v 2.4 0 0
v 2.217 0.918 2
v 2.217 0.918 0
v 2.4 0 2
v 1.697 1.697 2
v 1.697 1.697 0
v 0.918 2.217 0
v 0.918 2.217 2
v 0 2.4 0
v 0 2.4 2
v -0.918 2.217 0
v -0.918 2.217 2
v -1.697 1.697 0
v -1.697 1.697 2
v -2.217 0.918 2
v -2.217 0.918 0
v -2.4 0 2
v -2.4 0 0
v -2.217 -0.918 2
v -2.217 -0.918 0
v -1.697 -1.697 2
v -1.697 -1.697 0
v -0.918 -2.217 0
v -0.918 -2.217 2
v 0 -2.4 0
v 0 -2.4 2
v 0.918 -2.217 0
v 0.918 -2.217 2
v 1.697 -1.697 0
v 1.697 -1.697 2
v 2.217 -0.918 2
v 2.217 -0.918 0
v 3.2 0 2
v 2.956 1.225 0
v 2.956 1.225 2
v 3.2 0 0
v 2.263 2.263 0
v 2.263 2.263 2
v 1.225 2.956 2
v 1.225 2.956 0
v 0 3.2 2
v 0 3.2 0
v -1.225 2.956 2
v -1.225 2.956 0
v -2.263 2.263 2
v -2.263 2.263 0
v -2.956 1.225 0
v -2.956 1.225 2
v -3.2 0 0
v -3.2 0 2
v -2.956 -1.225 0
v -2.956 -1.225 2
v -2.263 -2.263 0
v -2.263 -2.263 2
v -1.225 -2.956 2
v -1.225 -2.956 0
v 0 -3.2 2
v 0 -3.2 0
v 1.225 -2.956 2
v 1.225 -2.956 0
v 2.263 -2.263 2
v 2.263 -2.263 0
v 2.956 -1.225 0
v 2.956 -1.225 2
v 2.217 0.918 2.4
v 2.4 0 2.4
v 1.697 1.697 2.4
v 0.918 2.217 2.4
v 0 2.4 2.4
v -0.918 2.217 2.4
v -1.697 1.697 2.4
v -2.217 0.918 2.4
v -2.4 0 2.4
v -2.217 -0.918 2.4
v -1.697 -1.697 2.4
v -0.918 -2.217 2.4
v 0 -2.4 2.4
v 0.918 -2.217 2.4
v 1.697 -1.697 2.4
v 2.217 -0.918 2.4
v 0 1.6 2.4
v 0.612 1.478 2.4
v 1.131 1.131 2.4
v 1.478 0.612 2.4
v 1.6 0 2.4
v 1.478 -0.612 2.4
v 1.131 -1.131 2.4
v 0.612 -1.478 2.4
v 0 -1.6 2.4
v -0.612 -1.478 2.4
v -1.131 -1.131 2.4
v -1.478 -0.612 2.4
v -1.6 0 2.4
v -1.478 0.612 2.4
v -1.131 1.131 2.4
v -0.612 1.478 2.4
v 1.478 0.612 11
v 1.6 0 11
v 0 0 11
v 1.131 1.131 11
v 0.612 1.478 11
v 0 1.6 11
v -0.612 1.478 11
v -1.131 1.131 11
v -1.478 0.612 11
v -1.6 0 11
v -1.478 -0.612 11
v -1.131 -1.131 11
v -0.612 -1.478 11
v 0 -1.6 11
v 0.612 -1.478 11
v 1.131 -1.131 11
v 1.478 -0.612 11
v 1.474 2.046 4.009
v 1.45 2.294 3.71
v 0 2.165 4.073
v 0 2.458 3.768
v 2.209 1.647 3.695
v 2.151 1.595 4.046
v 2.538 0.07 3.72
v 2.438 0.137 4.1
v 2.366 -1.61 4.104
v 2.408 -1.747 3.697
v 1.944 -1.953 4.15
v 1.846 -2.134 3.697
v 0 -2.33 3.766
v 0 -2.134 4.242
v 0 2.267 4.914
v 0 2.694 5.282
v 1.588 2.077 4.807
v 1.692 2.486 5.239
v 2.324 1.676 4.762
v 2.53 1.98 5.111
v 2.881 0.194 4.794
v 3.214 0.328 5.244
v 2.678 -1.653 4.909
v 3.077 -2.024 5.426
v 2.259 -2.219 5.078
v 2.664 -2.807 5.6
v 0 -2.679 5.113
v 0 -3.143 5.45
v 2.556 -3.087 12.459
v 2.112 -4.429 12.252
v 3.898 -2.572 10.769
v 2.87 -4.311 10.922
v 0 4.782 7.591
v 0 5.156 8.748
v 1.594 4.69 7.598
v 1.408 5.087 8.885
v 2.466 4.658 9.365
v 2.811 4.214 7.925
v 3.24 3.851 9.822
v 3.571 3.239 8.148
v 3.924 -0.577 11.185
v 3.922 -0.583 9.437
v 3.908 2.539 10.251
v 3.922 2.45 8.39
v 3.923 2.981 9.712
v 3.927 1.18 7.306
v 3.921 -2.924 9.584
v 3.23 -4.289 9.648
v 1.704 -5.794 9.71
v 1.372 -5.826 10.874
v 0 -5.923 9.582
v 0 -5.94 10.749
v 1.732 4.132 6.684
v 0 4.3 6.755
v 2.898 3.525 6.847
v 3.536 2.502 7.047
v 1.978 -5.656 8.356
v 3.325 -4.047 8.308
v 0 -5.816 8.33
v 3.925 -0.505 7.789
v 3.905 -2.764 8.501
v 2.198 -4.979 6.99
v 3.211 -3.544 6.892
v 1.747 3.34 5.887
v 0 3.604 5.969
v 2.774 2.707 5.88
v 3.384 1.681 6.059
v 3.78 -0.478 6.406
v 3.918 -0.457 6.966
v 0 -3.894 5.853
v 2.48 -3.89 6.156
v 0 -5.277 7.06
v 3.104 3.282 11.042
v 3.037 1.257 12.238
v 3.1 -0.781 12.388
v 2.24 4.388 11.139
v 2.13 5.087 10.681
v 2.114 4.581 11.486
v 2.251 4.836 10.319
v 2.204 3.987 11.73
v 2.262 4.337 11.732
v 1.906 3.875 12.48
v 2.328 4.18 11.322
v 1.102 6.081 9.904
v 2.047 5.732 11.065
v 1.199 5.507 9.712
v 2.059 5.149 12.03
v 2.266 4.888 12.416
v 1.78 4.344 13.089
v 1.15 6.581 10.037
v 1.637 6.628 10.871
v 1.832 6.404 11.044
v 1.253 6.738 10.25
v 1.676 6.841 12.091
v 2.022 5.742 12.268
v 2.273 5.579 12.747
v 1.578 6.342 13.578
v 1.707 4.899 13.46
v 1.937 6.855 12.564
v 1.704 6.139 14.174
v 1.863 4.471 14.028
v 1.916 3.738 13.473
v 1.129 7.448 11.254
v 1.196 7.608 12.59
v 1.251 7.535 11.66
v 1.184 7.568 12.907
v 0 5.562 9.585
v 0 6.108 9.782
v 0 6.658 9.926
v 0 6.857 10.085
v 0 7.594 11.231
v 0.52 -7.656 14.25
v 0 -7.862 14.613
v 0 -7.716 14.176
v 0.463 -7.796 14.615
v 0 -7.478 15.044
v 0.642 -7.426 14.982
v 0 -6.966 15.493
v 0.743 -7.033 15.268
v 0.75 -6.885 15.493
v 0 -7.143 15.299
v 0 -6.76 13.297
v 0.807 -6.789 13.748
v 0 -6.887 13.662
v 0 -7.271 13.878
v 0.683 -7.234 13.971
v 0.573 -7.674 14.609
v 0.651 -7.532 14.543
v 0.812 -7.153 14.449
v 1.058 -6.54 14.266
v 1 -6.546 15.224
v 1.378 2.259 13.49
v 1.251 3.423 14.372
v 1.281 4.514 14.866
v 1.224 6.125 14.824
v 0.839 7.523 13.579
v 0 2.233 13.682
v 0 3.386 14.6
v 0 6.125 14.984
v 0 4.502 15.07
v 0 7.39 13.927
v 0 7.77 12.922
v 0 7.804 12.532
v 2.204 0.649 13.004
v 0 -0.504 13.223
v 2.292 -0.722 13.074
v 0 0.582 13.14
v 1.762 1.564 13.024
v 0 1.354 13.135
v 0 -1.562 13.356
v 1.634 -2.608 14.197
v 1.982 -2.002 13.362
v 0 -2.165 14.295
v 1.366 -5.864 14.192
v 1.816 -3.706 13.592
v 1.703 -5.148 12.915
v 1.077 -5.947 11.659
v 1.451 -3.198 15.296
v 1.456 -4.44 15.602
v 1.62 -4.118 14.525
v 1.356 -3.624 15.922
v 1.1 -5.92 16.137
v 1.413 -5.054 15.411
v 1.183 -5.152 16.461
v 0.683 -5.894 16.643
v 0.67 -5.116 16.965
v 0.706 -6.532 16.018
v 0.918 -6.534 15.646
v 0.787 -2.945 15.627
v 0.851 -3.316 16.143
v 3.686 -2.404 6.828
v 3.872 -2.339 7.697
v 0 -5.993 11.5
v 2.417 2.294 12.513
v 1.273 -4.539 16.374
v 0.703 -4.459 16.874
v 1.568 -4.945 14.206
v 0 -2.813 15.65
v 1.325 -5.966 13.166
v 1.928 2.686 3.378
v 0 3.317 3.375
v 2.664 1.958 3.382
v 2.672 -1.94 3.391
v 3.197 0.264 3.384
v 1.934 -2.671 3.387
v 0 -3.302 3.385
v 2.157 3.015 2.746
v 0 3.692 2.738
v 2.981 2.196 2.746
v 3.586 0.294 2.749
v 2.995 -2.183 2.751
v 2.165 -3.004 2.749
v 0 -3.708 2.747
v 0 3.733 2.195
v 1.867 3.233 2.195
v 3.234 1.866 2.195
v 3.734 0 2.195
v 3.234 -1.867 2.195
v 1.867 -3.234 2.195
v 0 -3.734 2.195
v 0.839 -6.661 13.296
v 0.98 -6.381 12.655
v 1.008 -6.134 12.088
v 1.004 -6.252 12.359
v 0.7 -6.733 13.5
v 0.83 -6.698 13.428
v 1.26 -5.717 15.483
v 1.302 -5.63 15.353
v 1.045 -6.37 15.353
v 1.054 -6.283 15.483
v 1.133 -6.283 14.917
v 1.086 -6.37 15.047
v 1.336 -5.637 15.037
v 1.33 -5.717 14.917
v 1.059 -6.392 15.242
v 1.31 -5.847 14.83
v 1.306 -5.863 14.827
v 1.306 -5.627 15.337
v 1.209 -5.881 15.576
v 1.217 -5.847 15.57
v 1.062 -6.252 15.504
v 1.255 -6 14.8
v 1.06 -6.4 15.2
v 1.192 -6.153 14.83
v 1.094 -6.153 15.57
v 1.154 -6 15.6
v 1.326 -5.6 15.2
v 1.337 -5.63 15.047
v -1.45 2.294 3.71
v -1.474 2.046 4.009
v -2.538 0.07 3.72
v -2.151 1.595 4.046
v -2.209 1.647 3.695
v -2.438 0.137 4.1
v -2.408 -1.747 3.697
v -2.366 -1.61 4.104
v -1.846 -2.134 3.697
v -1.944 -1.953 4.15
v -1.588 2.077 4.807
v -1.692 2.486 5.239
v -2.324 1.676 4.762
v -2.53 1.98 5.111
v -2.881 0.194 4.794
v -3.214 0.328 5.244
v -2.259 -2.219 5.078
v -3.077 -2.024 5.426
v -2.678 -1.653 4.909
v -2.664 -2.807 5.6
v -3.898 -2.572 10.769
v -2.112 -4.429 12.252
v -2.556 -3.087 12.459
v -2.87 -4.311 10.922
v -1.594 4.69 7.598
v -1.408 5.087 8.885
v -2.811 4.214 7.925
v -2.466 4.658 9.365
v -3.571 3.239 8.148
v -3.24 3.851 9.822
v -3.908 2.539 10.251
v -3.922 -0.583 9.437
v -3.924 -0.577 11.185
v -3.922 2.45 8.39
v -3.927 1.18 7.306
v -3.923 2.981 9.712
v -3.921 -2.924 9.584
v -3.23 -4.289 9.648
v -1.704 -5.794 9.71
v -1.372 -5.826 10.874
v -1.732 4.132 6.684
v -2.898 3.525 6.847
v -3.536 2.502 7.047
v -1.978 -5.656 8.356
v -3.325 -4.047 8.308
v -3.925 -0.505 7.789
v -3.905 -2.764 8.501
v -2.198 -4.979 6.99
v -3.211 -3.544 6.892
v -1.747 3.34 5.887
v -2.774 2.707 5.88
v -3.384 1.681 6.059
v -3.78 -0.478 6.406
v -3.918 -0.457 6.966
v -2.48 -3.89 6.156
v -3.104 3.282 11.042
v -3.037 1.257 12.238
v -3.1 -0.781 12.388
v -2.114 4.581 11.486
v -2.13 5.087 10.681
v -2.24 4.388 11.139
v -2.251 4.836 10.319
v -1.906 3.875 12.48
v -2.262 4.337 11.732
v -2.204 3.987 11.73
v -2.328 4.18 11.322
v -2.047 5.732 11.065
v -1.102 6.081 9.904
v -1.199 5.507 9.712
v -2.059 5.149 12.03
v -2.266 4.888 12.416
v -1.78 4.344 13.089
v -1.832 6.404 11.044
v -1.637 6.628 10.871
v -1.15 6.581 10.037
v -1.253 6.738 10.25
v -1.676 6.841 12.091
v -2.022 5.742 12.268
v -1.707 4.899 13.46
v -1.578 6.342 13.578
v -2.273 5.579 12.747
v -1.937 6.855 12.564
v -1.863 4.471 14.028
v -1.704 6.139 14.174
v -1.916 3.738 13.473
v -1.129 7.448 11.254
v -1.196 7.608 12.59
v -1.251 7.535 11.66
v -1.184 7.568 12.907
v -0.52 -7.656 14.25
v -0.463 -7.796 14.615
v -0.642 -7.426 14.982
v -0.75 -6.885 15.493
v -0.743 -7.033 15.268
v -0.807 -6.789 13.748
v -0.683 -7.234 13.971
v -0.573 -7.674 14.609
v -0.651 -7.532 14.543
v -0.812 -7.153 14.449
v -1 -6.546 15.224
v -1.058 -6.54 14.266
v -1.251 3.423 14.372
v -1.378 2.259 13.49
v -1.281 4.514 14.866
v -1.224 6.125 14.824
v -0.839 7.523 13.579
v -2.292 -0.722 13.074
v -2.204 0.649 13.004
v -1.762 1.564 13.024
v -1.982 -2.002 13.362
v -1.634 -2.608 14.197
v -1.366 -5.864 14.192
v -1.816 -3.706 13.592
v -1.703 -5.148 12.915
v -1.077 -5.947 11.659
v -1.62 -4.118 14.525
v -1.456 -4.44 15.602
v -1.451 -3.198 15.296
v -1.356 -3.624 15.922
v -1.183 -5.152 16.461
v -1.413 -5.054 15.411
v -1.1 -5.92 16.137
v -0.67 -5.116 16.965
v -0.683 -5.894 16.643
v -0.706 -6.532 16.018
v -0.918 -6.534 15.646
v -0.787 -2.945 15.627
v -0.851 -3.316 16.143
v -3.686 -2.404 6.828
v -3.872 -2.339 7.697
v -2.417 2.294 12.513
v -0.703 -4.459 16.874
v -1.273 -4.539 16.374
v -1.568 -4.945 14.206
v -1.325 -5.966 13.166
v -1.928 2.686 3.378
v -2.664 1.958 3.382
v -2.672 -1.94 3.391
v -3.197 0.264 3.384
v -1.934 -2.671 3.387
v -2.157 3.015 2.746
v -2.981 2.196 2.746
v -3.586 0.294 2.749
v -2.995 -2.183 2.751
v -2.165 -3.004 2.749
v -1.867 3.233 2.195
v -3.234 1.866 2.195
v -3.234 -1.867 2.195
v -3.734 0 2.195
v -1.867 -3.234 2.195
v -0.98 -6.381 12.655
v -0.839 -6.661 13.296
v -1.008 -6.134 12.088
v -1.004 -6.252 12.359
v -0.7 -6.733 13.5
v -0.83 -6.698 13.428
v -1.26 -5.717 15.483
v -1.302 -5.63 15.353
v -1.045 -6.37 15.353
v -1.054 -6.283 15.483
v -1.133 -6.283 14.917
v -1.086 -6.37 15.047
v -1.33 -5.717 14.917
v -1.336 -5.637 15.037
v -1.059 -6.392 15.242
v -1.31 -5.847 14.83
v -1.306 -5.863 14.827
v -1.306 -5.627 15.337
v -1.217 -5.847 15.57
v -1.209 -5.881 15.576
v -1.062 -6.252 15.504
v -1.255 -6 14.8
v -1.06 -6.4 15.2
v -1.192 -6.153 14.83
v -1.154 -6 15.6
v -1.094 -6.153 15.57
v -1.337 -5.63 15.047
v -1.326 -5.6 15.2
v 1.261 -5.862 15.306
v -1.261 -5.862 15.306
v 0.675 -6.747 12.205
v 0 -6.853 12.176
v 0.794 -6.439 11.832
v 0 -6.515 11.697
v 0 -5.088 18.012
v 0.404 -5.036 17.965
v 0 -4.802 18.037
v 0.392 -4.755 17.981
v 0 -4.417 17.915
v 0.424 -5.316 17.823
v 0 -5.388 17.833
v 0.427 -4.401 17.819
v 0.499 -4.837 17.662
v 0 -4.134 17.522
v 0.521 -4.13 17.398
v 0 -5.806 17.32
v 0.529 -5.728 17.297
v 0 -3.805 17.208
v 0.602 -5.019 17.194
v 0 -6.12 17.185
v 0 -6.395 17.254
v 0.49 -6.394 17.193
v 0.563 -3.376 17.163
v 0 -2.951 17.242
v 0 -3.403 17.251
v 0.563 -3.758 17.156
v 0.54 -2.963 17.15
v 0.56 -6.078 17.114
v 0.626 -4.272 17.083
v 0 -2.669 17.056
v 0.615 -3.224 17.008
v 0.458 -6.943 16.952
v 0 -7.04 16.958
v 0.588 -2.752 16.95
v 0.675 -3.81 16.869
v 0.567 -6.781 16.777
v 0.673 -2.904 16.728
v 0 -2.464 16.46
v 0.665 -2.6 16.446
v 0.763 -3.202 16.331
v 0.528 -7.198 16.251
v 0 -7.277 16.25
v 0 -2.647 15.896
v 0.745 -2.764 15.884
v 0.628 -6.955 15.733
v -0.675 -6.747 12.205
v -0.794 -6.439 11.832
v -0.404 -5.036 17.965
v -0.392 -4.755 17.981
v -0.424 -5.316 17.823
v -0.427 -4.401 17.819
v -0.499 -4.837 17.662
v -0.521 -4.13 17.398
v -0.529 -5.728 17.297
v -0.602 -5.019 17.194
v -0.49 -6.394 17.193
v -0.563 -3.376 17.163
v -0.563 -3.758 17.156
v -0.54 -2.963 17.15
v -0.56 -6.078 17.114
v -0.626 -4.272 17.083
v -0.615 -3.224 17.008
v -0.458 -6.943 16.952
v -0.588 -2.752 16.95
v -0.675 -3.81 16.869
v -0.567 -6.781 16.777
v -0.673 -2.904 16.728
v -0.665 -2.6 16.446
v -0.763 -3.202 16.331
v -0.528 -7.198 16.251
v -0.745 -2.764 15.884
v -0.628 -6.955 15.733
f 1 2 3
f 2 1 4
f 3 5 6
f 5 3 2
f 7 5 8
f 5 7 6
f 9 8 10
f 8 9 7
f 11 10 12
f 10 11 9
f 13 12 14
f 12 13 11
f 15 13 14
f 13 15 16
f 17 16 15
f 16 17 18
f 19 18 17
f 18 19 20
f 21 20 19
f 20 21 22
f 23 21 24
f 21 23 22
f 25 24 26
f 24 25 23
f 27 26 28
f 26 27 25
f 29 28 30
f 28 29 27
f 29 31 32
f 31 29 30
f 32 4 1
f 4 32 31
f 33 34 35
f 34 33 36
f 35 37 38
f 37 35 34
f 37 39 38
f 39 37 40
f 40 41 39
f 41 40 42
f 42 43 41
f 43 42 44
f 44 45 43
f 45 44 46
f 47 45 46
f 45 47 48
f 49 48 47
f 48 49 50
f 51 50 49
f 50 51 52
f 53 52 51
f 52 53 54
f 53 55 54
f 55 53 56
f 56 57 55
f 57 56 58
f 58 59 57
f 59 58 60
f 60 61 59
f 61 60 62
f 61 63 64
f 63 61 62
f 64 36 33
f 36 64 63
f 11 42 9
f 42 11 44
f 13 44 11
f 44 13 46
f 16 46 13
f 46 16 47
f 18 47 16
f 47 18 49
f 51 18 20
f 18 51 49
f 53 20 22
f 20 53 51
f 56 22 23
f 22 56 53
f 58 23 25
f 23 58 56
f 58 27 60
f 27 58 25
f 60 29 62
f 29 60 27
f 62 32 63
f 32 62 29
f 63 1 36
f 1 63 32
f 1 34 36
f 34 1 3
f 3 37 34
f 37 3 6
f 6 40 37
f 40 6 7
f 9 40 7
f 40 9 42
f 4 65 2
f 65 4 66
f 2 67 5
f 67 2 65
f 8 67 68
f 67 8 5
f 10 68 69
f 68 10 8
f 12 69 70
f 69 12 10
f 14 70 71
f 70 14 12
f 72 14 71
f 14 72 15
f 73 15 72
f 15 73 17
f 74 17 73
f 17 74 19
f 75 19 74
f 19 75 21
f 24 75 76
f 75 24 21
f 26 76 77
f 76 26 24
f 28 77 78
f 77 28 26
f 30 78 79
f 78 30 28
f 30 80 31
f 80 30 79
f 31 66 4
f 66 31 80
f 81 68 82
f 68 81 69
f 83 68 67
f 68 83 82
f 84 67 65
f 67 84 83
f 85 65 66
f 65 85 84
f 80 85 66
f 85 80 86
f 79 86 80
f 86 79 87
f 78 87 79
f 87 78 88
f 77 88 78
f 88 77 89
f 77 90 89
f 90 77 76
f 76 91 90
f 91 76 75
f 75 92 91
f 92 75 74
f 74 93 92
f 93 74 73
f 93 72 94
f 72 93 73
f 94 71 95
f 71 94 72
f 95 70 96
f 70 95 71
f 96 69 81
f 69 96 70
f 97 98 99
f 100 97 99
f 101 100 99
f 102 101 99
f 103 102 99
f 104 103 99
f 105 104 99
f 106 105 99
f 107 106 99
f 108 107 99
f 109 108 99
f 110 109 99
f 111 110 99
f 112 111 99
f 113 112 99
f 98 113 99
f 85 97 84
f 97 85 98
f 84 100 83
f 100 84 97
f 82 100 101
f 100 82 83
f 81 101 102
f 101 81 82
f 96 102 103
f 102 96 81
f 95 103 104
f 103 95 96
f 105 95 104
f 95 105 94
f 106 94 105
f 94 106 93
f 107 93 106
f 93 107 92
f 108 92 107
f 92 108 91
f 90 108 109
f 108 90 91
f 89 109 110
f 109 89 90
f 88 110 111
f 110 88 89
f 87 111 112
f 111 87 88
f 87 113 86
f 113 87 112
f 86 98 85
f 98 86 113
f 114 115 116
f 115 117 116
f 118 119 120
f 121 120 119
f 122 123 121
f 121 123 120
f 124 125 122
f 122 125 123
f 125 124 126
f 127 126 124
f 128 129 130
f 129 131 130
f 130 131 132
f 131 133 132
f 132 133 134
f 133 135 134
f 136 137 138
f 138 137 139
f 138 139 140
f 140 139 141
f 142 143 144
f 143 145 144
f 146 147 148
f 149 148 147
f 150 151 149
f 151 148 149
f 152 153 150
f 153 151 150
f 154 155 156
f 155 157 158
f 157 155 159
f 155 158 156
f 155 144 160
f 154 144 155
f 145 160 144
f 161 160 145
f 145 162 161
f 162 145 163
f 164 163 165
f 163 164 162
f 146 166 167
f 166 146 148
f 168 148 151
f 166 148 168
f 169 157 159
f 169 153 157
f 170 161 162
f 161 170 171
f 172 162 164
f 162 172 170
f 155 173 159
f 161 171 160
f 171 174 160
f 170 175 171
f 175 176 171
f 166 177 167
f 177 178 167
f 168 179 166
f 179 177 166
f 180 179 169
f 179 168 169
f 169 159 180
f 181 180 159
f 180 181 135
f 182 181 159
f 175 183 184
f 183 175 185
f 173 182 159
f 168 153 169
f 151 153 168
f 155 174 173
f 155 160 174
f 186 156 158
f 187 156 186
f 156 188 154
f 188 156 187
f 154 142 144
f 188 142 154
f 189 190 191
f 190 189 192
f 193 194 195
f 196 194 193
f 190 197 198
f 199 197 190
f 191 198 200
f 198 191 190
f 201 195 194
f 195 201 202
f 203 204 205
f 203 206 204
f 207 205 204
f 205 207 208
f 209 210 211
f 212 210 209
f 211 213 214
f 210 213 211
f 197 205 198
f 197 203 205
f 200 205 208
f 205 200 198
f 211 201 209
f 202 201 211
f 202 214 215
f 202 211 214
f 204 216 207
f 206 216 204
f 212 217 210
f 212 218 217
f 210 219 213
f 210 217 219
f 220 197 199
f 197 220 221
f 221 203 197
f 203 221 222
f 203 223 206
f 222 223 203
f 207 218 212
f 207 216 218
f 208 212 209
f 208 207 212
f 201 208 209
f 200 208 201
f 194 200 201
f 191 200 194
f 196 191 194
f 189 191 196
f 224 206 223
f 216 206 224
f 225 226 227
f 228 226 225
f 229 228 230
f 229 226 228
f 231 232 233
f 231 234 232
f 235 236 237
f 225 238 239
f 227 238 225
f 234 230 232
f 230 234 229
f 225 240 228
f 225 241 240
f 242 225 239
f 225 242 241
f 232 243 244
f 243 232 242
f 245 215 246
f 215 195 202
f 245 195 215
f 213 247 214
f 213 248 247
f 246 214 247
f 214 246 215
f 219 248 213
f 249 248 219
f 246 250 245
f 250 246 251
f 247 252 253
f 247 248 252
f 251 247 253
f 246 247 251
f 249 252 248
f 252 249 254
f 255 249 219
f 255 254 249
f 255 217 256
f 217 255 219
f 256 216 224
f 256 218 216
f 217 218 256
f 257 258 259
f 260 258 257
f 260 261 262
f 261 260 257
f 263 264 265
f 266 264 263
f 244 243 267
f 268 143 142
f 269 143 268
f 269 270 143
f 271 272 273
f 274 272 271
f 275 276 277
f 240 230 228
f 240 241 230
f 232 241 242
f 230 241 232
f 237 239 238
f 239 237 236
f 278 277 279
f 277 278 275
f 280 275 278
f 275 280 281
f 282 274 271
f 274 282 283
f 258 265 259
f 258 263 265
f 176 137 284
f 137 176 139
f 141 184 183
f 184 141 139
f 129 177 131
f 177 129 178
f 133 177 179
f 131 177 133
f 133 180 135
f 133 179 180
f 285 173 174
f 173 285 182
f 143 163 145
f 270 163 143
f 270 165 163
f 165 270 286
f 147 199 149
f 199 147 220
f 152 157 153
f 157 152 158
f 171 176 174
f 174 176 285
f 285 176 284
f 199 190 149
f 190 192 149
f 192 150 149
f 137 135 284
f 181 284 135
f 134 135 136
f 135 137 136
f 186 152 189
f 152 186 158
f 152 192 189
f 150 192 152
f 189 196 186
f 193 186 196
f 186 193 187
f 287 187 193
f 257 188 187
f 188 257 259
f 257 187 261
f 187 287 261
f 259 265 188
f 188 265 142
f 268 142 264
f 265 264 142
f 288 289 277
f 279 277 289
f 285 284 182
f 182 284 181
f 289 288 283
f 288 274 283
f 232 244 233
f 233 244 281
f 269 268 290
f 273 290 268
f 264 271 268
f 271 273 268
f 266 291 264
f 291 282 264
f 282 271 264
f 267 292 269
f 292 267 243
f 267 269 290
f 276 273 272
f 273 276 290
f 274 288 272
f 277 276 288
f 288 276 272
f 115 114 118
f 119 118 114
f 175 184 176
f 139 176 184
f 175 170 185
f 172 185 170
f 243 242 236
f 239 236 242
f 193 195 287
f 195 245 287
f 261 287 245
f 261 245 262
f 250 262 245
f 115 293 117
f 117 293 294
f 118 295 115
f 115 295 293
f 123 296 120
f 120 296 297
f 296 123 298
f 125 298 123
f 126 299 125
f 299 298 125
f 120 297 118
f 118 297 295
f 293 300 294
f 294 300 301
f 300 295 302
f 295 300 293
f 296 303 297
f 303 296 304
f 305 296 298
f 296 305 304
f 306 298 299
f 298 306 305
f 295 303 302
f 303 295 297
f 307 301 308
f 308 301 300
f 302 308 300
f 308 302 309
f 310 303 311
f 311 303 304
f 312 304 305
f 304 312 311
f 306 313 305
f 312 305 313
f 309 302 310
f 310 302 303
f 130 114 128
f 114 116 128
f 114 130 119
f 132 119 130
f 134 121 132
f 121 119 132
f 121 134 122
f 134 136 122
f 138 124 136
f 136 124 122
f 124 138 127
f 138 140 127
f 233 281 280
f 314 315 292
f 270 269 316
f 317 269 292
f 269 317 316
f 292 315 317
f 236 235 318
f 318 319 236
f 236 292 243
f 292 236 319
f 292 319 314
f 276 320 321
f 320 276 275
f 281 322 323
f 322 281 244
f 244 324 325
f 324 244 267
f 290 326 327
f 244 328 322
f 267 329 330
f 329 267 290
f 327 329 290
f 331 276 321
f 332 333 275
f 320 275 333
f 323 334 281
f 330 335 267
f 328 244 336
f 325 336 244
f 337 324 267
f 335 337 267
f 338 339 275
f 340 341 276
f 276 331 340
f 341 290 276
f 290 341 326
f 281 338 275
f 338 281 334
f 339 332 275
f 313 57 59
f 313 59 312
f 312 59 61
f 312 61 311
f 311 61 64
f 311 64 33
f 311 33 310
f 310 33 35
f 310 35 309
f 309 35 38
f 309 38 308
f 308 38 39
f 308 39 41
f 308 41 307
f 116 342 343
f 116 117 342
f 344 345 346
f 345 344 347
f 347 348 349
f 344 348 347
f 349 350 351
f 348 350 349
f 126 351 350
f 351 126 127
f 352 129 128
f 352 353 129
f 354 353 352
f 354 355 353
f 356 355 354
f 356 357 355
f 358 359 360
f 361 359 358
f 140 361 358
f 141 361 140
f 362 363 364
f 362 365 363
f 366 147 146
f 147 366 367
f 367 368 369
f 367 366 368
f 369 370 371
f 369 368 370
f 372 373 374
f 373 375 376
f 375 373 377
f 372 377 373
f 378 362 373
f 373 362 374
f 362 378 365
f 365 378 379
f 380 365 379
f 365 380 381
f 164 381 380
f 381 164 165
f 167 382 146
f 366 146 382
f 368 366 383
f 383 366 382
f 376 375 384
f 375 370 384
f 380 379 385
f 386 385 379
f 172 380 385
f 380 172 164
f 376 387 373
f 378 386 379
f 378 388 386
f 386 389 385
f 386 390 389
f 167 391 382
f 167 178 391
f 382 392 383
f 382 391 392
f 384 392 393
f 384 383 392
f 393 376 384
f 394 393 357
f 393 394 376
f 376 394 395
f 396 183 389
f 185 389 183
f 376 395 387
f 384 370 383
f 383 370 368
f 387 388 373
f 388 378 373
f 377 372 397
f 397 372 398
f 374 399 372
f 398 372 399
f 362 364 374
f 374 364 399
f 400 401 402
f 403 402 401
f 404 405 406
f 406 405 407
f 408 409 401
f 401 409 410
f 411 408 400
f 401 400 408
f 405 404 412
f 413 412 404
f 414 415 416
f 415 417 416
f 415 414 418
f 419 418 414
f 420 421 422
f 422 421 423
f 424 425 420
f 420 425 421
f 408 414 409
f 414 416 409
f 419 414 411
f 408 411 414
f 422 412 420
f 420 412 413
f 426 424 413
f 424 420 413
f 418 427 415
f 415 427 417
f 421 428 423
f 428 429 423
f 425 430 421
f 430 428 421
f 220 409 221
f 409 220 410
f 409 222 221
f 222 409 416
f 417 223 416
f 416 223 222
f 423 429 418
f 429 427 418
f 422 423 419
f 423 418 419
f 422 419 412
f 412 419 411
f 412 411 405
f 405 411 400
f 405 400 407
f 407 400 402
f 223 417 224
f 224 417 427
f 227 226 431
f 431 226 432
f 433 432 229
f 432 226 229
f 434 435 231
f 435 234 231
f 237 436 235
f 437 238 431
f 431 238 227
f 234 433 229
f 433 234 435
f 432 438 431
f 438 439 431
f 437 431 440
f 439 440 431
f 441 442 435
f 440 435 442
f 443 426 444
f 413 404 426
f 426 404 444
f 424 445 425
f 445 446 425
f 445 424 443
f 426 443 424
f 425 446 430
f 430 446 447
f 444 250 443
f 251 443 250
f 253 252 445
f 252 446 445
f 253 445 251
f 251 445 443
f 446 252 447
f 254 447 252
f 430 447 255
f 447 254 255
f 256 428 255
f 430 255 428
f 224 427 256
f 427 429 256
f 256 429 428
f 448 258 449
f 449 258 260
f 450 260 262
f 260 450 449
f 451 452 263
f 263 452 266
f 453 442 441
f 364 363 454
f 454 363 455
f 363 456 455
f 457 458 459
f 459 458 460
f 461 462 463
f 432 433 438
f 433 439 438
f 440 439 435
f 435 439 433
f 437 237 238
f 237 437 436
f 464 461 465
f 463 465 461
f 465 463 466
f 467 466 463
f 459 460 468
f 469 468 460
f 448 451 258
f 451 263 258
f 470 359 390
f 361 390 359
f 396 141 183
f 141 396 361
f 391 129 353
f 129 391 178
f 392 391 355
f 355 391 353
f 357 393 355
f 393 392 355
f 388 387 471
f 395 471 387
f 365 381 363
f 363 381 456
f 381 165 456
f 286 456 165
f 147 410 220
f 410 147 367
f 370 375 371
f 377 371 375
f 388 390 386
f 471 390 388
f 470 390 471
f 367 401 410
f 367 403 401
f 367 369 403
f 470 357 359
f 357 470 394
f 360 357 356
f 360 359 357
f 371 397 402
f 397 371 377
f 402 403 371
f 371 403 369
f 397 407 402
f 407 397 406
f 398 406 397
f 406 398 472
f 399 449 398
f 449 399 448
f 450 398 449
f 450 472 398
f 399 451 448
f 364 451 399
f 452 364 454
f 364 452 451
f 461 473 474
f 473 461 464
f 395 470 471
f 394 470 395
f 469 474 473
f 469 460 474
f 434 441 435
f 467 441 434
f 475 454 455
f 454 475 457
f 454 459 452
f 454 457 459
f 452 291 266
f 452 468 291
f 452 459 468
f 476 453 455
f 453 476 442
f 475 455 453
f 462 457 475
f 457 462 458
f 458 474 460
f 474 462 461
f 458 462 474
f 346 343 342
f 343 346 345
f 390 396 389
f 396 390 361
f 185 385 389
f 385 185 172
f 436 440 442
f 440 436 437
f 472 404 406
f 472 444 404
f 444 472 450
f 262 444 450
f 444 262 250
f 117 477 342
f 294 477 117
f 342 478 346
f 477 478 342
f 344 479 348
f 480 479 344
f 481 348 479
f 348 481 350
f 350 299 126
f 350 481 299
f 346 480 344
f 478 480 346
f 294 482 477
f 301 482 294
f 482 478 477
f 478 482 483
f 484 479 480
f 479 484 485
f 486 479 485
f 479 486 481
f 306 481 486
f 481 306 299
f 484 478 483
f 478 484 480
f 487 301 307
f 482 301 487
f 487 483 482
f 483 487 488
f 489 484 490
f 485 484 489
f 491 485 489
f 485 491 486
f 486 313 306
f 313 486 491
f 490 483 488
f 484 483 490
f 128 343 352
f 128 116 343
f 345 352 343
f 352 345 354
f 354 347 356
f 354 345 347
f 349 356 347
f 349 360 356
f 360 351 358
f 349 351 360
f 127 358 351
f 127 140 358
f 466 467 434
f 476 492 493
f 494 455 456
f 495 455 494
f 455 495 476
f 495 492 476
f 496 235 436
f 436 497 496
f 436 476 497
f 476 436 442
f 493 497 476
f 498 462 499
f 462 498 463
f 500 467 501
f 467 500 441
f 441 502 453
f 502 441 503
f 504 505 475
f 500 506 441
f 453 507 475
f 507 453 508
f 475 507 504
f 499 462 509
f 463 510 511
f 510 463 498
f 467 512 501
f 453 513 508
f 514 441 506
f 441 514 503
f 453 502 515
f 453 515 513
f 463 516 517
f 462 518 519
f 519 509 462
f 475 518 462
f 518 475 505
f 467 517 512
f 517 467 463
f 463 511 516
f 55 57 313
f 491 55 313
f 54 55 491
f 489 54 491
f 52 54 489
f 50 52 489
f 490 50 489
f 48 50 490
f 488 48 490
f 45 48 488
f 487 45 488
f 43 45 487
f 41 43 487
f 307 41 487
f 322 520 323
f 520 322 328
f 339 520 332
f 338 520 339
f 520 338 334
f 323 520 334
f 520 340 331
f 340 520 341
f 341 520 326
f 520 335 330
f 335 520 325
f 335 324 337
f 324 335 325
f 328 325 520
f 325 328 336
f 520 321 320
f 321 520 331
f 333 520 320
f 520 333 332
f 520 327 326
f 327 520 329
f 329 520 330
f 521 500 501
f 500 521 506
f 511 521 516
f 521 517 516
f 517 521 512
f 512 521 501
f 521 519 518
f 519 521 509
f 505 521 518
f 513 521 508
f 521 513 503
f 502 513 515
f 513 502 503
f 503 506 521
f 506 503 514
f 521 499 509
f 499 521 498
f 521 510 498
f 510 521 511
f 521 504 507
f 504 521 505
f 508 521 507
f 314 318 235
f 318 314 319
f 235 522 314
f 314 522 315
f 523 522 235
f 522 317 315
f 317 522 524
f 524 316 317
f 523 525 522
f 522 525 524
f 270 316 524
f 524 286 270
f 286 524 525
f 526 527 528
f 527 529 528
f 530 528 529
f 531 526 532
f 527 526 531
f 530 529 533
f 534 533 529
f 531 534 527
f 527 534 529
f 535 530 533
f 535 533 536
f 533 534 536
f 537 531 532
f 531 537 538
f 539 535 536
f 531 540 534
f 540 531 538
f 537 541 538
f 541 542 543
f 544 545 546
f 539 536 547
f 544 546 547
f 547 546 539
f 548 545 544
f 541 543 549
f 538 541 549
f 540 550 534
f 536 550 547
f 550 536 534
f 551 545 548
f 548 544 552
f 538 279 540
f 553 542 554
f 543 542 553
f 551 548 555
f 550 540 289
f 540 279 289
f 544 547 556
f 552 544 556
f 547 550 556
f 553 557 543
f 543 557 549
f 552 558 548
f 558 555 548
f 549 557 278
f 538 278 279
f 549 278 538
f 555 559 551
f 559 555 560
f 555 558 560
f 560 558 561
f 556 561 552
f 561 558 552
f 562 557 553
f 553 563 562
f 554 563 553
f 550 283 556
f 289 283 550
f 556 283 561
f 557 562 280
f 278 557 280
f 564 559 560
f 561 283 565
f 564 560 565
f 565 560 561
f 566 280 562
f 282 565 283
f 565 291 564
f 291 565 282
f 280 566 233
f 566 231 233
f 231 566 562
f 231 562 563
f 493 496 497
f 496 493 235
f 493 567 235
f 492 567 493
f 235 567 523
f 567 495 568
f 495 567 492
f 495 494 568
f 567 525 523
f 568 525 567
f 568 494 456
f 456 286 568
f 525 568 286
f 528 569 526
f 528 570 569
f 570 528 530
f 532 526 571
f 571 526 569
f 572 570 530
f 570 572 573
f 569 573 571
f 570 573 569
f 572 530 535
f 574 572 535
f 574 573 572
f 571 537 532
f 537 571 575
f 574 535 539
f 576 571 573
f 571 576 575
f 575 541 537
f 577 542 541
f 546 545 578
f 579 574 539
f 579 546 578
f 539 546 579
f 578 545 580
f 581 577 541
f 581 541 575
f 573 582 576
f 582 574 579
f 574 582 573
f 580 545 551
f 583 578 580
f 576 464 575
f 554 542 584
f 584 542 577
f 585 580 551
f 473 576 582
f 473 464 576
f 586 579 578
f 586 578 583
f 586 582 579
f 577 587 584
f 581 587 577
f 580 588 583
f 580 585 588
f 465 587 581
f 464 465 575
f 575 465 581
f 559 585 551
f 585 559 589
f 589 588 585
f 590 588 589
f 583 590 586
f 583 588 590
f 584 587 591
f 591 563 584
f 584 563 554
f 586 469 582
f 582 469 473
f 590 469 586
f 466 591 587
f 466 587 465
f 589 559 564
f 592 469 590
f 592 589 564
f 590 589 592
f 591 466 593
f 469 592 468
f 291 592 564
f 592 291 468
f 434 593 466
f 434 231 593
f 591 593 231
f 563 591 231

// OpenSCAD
use <../lib.scad>
use <../p/4-4cylc.scad>
use <../p/4-4cyli.scad>
use <../p/4-4edge.scad>
use <../p/4-4ring2.scad>
use <s/95342s01.scad>
use <s/95342s02.scad>
use <s/95342s03.scad>
use <../p/stud4a.scad>
function ldraw_lib__95342p01() = [
// 0 Animal Chicken with Red Comb Pattern
// 0 Name: 95342p01.dat
// 0 Author: Magnus Forsberg [MagFors]
// 0 !LDRAW_ORG Part UPDATE 2011-02
// 0 !LICENSE Licensed under CC BY 4.0 : see CAreadme.txt
// 
// 0 BFC CERTIFY CCW
  [0,"BFC","CERTIFY"],
  [0,"BFC","CCW"],
// 
// 0 !HISTORY 2011-12-29 [PTadmin] Official Update 2011-02
// 
// 
// 1 16 0 -5 0 1 0 0 0 -1.25 0 0 0 1 stud4a.dat
  [1,16,0,-5,0,1,0,0,0,-1.25,0,0,0,1, ldraw_lib__stud4a()],
// 1 16 0 -6 0 6 0 0 0 1 0 0 0 6 4-4edge.dat
  [1,16,0,-6,0,6,0,0,0,1,0,0,0,6, ldraw_lib__4_4edge()],
// 0 BFC INVERTNEXT
  [0,"BFC","INVERTNEXT"],
// 1 16 0 -6 0 6 0 0 0 1 0 0 0 6 4-4cyli.dat
  [1,16,0,-6,0,6,0,0,0,1,0,0,0,6, ldraw_lib__4_4cyli()],
// 1 16 0 -6 0 -2 0 0 0 -1 0 0 0 2 4-4ring2.dat
  [1,16,0,-6,0,-2,0,0,0,-1,0,0,0,2, ldraw_lib__4_4ring2()],
// 0 BFC INVERTNEXT
  [0,"BFC","INVERTNEXT"],
// 1 16 0 -27.5 0 4 0 0 0 21.5 0 0 0 4 4-4cylc.dat
  [1,16,0,-27.5,0,4,0,0,0,21.5,0,0,0,4, ldraw_lib__4_4cylc()],
// 1 16 0 -5 0 8 0 0 0 1 0 0 0 8 4-4edge.dat
  [1,16,0,-5,0,8,0,0,0,1,0,0,0,8, ldraw_lib__4_4edge()],
// 1 16 0 0 0 1 0 0 0 1 0 0 0 1 s\95342s01.dat
  [1,16,0,0,0,1,0,0,0,1,0,0,0,1, ldraw_lib__s__95342s01()],
// 1 16 0 0 0 -1 0 0 0 1 0 0 0 1 s\95342s01.dat
  [1,16,0,0,0,-1,0,0,0,1,0,0,0,1, ldraw_lib__s__95342s01()],
// 1 0 0 0 0 1 0 0 0 1 0 0 0 1 s\95342s02.dat
  [1,0,0,0,0,1,0,0,0,1,0,0,0,1, ldraw_lib__s__95342s02()],
// 1 0 0 0 0 -1 0 0 0 1 0 0 0 1 s\95342s02.dat
  [1,0,0,0,0,-1,0,0,0,1,0,0,0,1, ldraw_lib__s__95342s02()],
// 1 4 0 0 0 1 0 0 0 1 0 0 0 1 s\95342s03.dat
  [1,4,0,0,0,1,0,0,0,1,0,0,0,1, ldraw_lib__s__95342s03()],
// 1 4 0 0 0 -1 0 0 0 1 0 0 0 1 s\95342s03.dat
  [1,4,0,0,0,-1,0,0,0,1,0,0,0,1, ldraw_lib__s__95342s03()],
// 0 //
// 5 24 0 -9.42 6.146 0 -10.183 5.412 3.624 -9.275 5.736 -3.624 -9.275 5.736
  [5,24,0,-9.42,6.146,0,-10.183,5.412,3.624,-9.275,5.736,-3.624,-9.275,5.736],
// 5 24 0 -10.606 -5.336 0 -9.415 -5.824 4.859 -10.375 -4.882 -4.859 -10.375 -4.882
  [5,24,0,-10.606,-5.336,0,-9.415,-5.824,4.859,-10.375,-4.882,-4.859,-10.375,-4.882],
// 5 24 0 -12.284 5.667 0 -13.206 6.734 3.97 -12.018 5.193 -3.97 -12.018 5.193
  [5,24,0,-12.284,5.667,0,-13.206,6.734,3.97,-12.018,5.193,-3.97,-12.018,5.193],
// 5 24 0 -13.625 -7.857 0 -12.783 -6.698 6.66 -13.999 -7.017 -6.66 -13.999 -7.017
  [5,24,0,-13.625,-7.857,0,-12.783,-6.698,6.66,-13.999,-7.017,-6.66,-13.999,-7.017],
// 5 24 0 -18.978 11.956 0 -21.87 12.891 3.984 -18.996 11.726 -3.984 -18.996 11.726
  [5,24,0,-18.978,11.956,0,-21.87,12.891,3.984,-18.996,11.726,-3.984,-18.996,11.726],
// 5 24 0 -26.873 -14.851 0 -23.955 -14.807 4.261 -24.274 -14.486 -3.429 -27.184 -14.566
  [5,24,0,-26.873,-14.851,0,-23.955,-14.807,4.261,-24.274,-14.486,-3.429,-27.184,-14.566],
// 5 24 0 -16.887 10.749 0 -18.978 11.956 4.331 -16.71 10.331 -4.331 -16.71 10.331
  [5,24,0,-16.887,10.749,0,-18.978,11.956,4.331,-16.71,10.331,-4.331,-16.71,10.331],
// 5 24 0 -23.955 -14.807 0 -20.826 -14.539 4.945 -20.889 -14.141 -4.261 -24.274 -14.486
  [5,24,0,-23.955,-14.807,0,-20.826,-14.539,4.945,-20.889,-14.141,-4.261,-24.274,-14.486],
// 5 24 0 -14.922 9.011 0 -16.887 10.749 4.367 -14.717 8.349 -4.367 -14.717 8.349
  [5,24,0,-14.922,9.011,0,-16.887,10.749,4.367,-14.717,8.349,-4.367,-14.717,8.349],
// 5 24 0 -17.651 -13.193 0 -14.633 -9.734 5.495 -17.475 -12.448 -5.495 -17.475 -12.448
  [5,24,0,-17.651,-13.193,0,-14.633,-9.734,5.495,-17.475,-12.448,-5.495,-17.475,-12.448],
// 5 24 0 -23.962 13.906 0 -24.455 15.271 2.755 -24.76 15.203 -2.998 -24.28 13.767
  [5,24,0,-23.962,13.906,0,-24.455,15.271,2.755,-24.76,15.203,-2.998,-24.28,13.767],
// 5 24 0 -24.455 15.271 0 -24.814 16.644 2.876 -25.092 16.452 -2.876 -25.092 16.452
  [5,24,0,-24.455,15.271,0,-24.814,16.644,2.876,-25.092,16.452,-2.876,-25.092,16.452],
// 5 24 0 -24.814 16.644 0 -25.213 17.143 2.876 -25.092 16.452 -2.876 -25.092 16.452
  [5,24,0,-24.814,16.644,0,-25.213,17.143,2.876,-25.092,16.452,-2.876,-25.092,16.452],
// 5 24 0 -25.213 17.143 0 -28.078 18.984 3.132 -25.624 16.845 -3.132 -25.624 16.845
  [5,24,0,-25.213,17.143,0,-28.078,18.984,3.132,-25.624,16.845,-3.132,-25.624,16.845],
// 5 24 0 -29.243 -16.287 0 -28.75 -14.982 1.984 -29.579 -16.097 -1.984 -29.579 -16.097
  [5,24,0,-29.243,-16.287,0,-28.75,-14.982,1.984,-29.579,-16.097,-1.984,-29.579,-16.097],
// 5 24 0 -36.533 -19.655 0 -35.441 -19.289 1.301 -35.626 -19.141 -1.301 -35.626 -19.141
  [5,24,0,-36.533,-19.655,0,-35.441,-19.289,1.301,-35.626,-19.141,-1.301,-35.626,-19.141],
// 5 24 0 -37.609 -18.695 0 -36.533 -19.655 1.157 -36.538 -19.49 -1.157 -36.538 -19.49
  [5,24,0,-37.609,-18.695,0,-36.533,-19.655,1.157,-36.538,-19.49,-1.157,-36.538,-19.49],
// 5 24 0 -38.732 -17.415 0 -38.247 -17.858 1.857 -38.171 -17.583 -1.857 -38.171 -17.583
  [5,24,0,-38.732,-17.415,0,-38.247,-17.858,1.857,-38.171,-17.583,-1.857,-38.171,-17.583],
// 5 24 0 -40.626 -18.193 0 -38.732 -17.415 1.321 -40.628 -17.996 -1.321 -40.628 -17.996
  [5,24,0,-40.626,-18.193,0,-38.732,-17.415,1.321,-40.628,-17.996,-1.321,-40.628,-17.996],
// 5 24 0 -42.395 -17.6 0 -40.626 -18.193 1.145 -42.379 -17.357 -1.145 -42.379 -17.357
  [5,24,0,-42.395,-17.6,0,-40.626,-18.193,1.145,-42.379,-17.357,-1.145,-42.379,-17.357],
// 5 24 0 -43.135 -15.988 0 -42.395 -17.6 1.145 -42.379 -17.357 -1.145 -42.379 -17.357
  [5,24,0,-43.135,-15.988,0,-42.395,-17.6,1.145,-42.379,-17.357,-1.145,-42.379,-17.357],
// 5 24 0 -42.963 -15.299 0 -43.135 -15.988 1.224 -42.983 -15.985 -1.224 -42.983 -15.985
  [5,24,0,-42.963,-15.299,0,-43.135,-15.988,1.224,-42.983,-15.985,-1.224,-42.983,-15.985],
// 5 24 0 -45.03 -12.72 0 -44.583 -13.47 1.059 -44.557 -13.289 -1.059 -44.557 -13.289
  [5,24,0,-45.03,-12.72,0,-44.583,-13.47,1.059,-44.557,-13.289,-1.059,-44.557,-13.289],
// 5 24 0 -44.787 -11.042 0 -45.092 -12.005 0.98 -44.952 -11.888 -0.98 -44.952 -11.888
  [5,24,0,-44.787,-11.042,0,-45.092,-12.005,0.98,-44.952,-11.888,-0.98,-44.952,-11.888],
// 5 24 0 -41.149 -6.16 0 -42.64 -6.673 1.469 -42.375 -6.88 -1.662 -41.115 -6.5
  [5,24,0,-41.149,-6.16,0,-42.64,-6.673,1.469,-42.375,-6.88,-1.662,-41.115,-6.5],
// 5 24 0 -39.739 -6.618 0 -41.149 -6.16 1.662 -41.115 -6.5 -1.662 -41.115 -6.5
  [5,24,0,-39.739,-6.618,0,-41.149,-6.16,1.662,-41.115,-6.5,-1.662,-41.115,-6.5],
// 5 24 0 -30.44 -17.132 0 -29.243 -16.287 1.687 -30.512 -16.868 -1.687 -30.512 -16.868
  [5,24,0,-30.44,-17.132,0,-29.243,-16.287,1.687,-30.512,-16.868,-1.687,-30.512,-16.868],
// 5 24 0 -33.243 -16.899 0 -30.44 -17.132 1.687 -30.512 -16.868 -1.687 -30.512 -16.868
  [5,24,0,-33.243,-16.899,0,-30.44,-17.132,1.687,-30.512,-16.868,-1.687,-30.512,-16.868],
// 5 24 0 -34.154 -17.217 0 -33.243 -16.899 2.017 -34.369 -16.972 -2.017 -34.369 -16.972
  [5,24,0,-34.154,-17.217,0,-33.243,-16.899,2.017,-34.369,-16.972,-2.017,-34.369,-16.972],
// 5 24 0 -35.441 -19.289 0 -34.694 -18.177 1.301 -35.626 -19.141 -1.301 -35.626 -19.141
  [5,24,0,-35.441,-19.289,0,-34.694,-18.177,1.301,-35.626,-19.141,-1.301,-35.626,-19.141],
// 5 24 0 -38.247 -17.858 0 -37.609 -18.695 1.606 -37.455 -18.566 -1.857 -38.171 -17.583
  [5,24,0,-38.247,-17.858,0,-37.609,-18.695,1.606,-37.455,-18.566,-1.857,-38.171,-17.583],
// 5 24 0 -43.299 -14.515 0 -42.963 -15.299 1.322 -43.242 -14.32 -1.322 -43.242 -14.32
  [5,24,0,-43.299,-14.515,0,-42.963,-15.299,1.322,-43.242,-14.32,-1.322,-43.242,-14.32],
// 5 24 0 -44.583 -13.47 0 -43.299 -14.515 1.322 -43.242 -14.32 -1.059 -44.557 -13.289
  [5,24,0,-44.583,-13.47,0,-43.299,-14.515,1.322,-43.242,-14.32,-1.059,-44.557,-13.289],
// 5 24 0 -43.805 -10.336 0 -44.787 -11.042 1.068 -44.547 -11.002 -1.068 -44.547 -11.002
  [5,24,0,-43.805,-10.336,0,-44.787,-11.042,1.068,-44.547,-11.002,-1.068,-44.547,-11.002],
// 5 24 0 -43.105 -7.378 0 -43.128 -8.507 1.408 -42.907 -8.439 -1.408 -42.907 -8.439
  [5,24,0,-43.105,-7.378,0,-43.128,-8.507,1.408,-42.907,-8.439,-1.408,-42.907,-8.439],
// 5 24 0 -39.126 -7.033 0 -39.739 -6.618 1.863 -39.709 -6.909 -1.967 -39.067 -7.362
  [5,24,0,-39.126,-7.033,0,-39.739,-6.618,1.863,-39.709,-6.909,-1.967,-39.067,-7.362],
// 5 24 0 -42.64 -6.673 0 -43.105 -7.378 1.351 -42.876 -7.408 -1.351 -42.876 -7.408
  [5,24,0,-42.64,-6.673,0,-43.105,-7.378,1.351,-42.876,-7.408,-1.351,-42.876,-7.408],
// 5 24 0 -43.021 -9.513 0 -43.805 -10.336 1.302 -43.495 -10.324 -1.302 -43.495 -10.324
  [5,24,0,-43.021,-9.513,0,-43.805,-10.336,1.302,-43.495,-10.324,-1.302,-43.495,-10.324],
// 5 24 0 -36.499 8.465 0 -34.204 5.583 3.128 -35.931 8.557 -3.128 -35.931 8.557
  [5,24,0,-36.499,8.465,0,-34.204,5.583,3.128,-35.931,8.557,-3.128,-35.931,8.557],
// 5 24 0 -37.46 15.312 0 -37.676 11.254 3.202 -37.165 11.285 -3.202 -37.165 11.285
  [5,24,0,-37.46,15.312,0,-37.676,11.254,3.202,-37.165,11.285,-3.202,-37.165,11.285],
// 5 24 0 -37.676 11.254 0 -36.499 8.465 3.202 -37.165 11.285 -3.202 -37.165 11.285
  [5,24,0,-37.676,11.254,0,-36.499,8.465,3.202,-37.165,11.285,-3.202,-37.165,11.285],
// 5 24 0 -34.817 18.476 0 -37.46 15.312 2.097 -33.947 18.808 -2.097 -33.947 18.808
  [5,24,0,-34.817,18.476,0,-37.46,15.312,2.097,-33.947,18.808,-2.097,-33.947,18.808],
// 5 24 0 -32.306 19.426 0 -34.817 18.476 2.097 -33.947 18.808 -2.097 -33.947 18.808
  [5,24,0,-32.306,19.426,0,-34.817,18.476,2.097,-33.947,18.808,-2.097,-33.947,18.808],
// 5 24 0 -31.33 19.51 0 -32.306 19.426 2.991 -31.474 19.021 -2.991 -31.474 19.021
  [5,24,0,-31.33,19.51,0,-32.306,19.426,2.991,-31.474,19.021,-2.991,-31.474,19.021],
// 5 24 0 -28.078 18.984 0 -31.33 19.51 2.822 -28.136 18.619 -2.822 -28.136 18.619
  [5,24,0,-28.078,18.984,0,-31.33,19.51,2.822,-28.136,18.619,-2.822,-28.136,18.619],
// 5 24 0 -32.85 1.456 0 -33.057 -1.261 5.511 -32.51 1.622 -5.511 -32.51 1.622
  [5,24,0,-32.85,1.456,0,-33.057,-1.261,5.511,-32.51,1.622,-5.511,-32.51,1.622],
// 5 24 0 -32.838 3.384 0 -32.85 1.456 5.511 -32.51 1.622 -4.405 -32.559 3.909
  [5,24,0,-32.838,3.384,0,-32.85,1.456,5.511,-32.51,1.622,-4.405,-32.559,3.909],
// 5 24 0 -33.389 -3.905 0 -35.737 -5.413 4.084 -35.492 -6.519 -4.084 -35.492 -6.519
  [5,24,0,-33.389,-3.905,0,-35.737,-5.413,4.084,-35.492,-6.519,-4.084,-35.492,-6.519],
// 5 24 0 -34.694 -18.177 0 -34.154 -17.217 2.017 -34.369 -16.972 -1.707 -34.928 -18.085
  [5,24,0,-34.694,-18.177,0,-34.154,-17.217,2.017,-34.369,-16.972,-1.707,-34.928,-18.085],
// 5 24 0 -33.057 -1.261 0 -33.389 -3.905 4.954 -33.404 -5.006 -4.954 -33.404 -5.006
  [5,24,0,-33.057,-1.261,0,-33.389,-3.905,4.954,-33.404,-5.006,-4.954,-33.404,-5.006],
// 5 24 0 -14.633 -9.734 0 -13.625 -7.857 6.66 -13.999 -7.017 -6.201 -15.391 -9.725
  [5,24,0,-14.633,-9.734,0,-13.625,-7.857,6.66,-13.999,-7.017,-6.201,-15.391,-9.725],
// 5 24 0 -13.206 6.734 0 -14.922 9.011 4.367 -14.717 8.349 -4.367 -14.717 8.349
  [5,24,0,-13.206,6.734,0,-14.922,9.011,4.367,-14.717,8.349,-4.367,-14.717,8.349],
// 5 24 0 -43.128 -8.507 0 -43.021 -9.513 1.408 -42.891 -9.396 -1.408 -42.891 -9.396
  [5,24,0,-43.128,-8.507,0,-43.021,-9.513,1.408,-42.891,-9.396,-1.408,-42.891,-9.396],
// 5 24 0 -28.75 -14.982 0 -26.873 -14.851 2.693 -29.147 -14.868 -2.693 -29.147 -14.868
  [5,24,0,-28.75,-14.982,0,-26.873,-14.851,2.693,-29.147,-14.868,-2.693,-29.147,-14.868],
// 5 24 0 -21.87 12.891 0 -23.962 13.906 2.998 -24.28 13.767 -3.521 -22.212 12.717
  [5,24,0,-21.87,12.891,0,-23.962,13.906,2.998,-24.28,13.767,-3.521,-22.212,12.717],
// 5 24 0 -35.737 -5.413 0 -39.126 -7.033 4.084 -35.492 -6.519 -4.084 -35.492 -6.519
  [5,24,0,-35.737,-5.413,0,-39.126,-7.033,4.084,-35.492,-6.519,-4.084,-35.492,-6.519],
// 5 24 0 -20.826 -14.539 0 -17.651 -13.193 4.945 -20.889 -14.141 -4.945 -20.889 -14.141
  [5,24,0,-20.826,-14.539,0,-17.651,-13.193,4.945,-20.889,-14.141,-4.945,-20.889,-14.141],
// 5 24 0 -45.092 -12.005 0 -45.03 -12.72 1.01 -44.913 -12.591 -1.01 -44.913 -12.591
  [5,24,0,-45.092,-12.005,0,-45.03,-12.72,1.01,-44.913,-12.591,-1.01,-44.913,-12.591],
// 5 24 0 -34.204 5.583 0 -32.838 3.384 3.445 -33.725 5.647 -3.445 -33.725 5.647
  [5,24,0,-34.204,5.583,0,-32.838,3.384,3.445,-33.725,5.647,-3.445,-33.725,5.647],
// 5 24 0 -8.438 8.293 0 -9.42 6.146 4.821 -8.445 6.716 -4.821 -8.445 6.716
  [5,24,0,-8.438,8.293,0,-9.42,6.146,4.821,-8.445,6.716,-4.821,-8.445,6.716],
// 5 24 0 -9.415 -5.824 0 -8.462 -8.255 4.615 -9.243 -5.336 -4.615 -9.243 -5.336
  [5,24,0,-9.415,-5.824,0,-8.462,-8.255,4.615,-9.243,-5.336,-4.615,-9.243,-5.336],
// 5 24 0 -6.846 9.231 0 -8.438 8.293 5.393 -6.864 7.538 -5.393 -6.864 7.538
  [5,24,0,-6.846,9.231,0,-8.438,8.293,5.393,-6.864,7.538,-5.393,-6.864,7.538],
// 5 24 0 -8.462 -8.255 0 -6.868 -9.269 5.413 -6.873 -7.511 -4.836 -8.468 -6.677
  [5,24,0,-8.462,-8.255,0,-6.868,-9.269,5.413,-6.873,-7.511,-4.836,-8.468,-6.677],
// 5 24 0 -5.488 9.333 0 -6.846 9.231 4.667 -5.488 8.083 -4.667 -5.488 8.083
  [5,24,0,-5.488,9.333,0,-6.846,9.231,4.667,-5.488,8.083,-4.667,-5.488,8.083],
// 5 24 0 -6.868 -9.269 0 -5.488 -9.334 5.413 -6.873 -7.511 -5.413 -6.873 -7.511
  [5,24,0,-6.868,-9.269,0,-5.488,-9.334,5.413,-6.873,-7.511,-5.413,-6.873,-7.511],
// 5 24 0 -10.183 5.412 0 -12.284 5.667 3.685 -10.022 5.114 -3.685 -10.022 5.114
  [5,24,0,-10.183,5.412,0,-12.284,5.667,3.685,-10.022,5.114,-3.685,-10.022,5.114],
// 5 24 0 -12.783 -6.698 0 -10.606 -5.336 5.648 -12.695 -5.548 -5.648 -12.695 -5.548
  [5,24,0,-12.783,-6.698,0,-10.606,-5.336,5.648,-12.695,-5.548,-5.648,-12.695,-5.548],
// 5 24 0 -5.488 -9.334 0 -5 -8 3.062 -5 -7.391 -3.062 -5 -7.391
  [5,24,0,-5.488,-9.334,0,-5,-8,3.062,-5,-7.391,-3.062,-5,-7.391],
// 5 24 0 -5 8 0 -5.488 9.333 4.667 -5.488 8.083 -4.667 -5.488 8.083
  [5,24,0,-5,8,0,-5.488,9.333,4.667,-5.488,8.083,-4.667,-5.488,8.083],
];
module ldraw_lib__95342p01(step=0, col=false, unit=2/5, alt=false, line=0.2, solid=!$preview)
    makepoly(ldraw_lib__95342p01(), step=step, col=col, unit=unit, alt=alt, line=line, solid=solid);
ldraw_lib__95342p01(line=0.2);
